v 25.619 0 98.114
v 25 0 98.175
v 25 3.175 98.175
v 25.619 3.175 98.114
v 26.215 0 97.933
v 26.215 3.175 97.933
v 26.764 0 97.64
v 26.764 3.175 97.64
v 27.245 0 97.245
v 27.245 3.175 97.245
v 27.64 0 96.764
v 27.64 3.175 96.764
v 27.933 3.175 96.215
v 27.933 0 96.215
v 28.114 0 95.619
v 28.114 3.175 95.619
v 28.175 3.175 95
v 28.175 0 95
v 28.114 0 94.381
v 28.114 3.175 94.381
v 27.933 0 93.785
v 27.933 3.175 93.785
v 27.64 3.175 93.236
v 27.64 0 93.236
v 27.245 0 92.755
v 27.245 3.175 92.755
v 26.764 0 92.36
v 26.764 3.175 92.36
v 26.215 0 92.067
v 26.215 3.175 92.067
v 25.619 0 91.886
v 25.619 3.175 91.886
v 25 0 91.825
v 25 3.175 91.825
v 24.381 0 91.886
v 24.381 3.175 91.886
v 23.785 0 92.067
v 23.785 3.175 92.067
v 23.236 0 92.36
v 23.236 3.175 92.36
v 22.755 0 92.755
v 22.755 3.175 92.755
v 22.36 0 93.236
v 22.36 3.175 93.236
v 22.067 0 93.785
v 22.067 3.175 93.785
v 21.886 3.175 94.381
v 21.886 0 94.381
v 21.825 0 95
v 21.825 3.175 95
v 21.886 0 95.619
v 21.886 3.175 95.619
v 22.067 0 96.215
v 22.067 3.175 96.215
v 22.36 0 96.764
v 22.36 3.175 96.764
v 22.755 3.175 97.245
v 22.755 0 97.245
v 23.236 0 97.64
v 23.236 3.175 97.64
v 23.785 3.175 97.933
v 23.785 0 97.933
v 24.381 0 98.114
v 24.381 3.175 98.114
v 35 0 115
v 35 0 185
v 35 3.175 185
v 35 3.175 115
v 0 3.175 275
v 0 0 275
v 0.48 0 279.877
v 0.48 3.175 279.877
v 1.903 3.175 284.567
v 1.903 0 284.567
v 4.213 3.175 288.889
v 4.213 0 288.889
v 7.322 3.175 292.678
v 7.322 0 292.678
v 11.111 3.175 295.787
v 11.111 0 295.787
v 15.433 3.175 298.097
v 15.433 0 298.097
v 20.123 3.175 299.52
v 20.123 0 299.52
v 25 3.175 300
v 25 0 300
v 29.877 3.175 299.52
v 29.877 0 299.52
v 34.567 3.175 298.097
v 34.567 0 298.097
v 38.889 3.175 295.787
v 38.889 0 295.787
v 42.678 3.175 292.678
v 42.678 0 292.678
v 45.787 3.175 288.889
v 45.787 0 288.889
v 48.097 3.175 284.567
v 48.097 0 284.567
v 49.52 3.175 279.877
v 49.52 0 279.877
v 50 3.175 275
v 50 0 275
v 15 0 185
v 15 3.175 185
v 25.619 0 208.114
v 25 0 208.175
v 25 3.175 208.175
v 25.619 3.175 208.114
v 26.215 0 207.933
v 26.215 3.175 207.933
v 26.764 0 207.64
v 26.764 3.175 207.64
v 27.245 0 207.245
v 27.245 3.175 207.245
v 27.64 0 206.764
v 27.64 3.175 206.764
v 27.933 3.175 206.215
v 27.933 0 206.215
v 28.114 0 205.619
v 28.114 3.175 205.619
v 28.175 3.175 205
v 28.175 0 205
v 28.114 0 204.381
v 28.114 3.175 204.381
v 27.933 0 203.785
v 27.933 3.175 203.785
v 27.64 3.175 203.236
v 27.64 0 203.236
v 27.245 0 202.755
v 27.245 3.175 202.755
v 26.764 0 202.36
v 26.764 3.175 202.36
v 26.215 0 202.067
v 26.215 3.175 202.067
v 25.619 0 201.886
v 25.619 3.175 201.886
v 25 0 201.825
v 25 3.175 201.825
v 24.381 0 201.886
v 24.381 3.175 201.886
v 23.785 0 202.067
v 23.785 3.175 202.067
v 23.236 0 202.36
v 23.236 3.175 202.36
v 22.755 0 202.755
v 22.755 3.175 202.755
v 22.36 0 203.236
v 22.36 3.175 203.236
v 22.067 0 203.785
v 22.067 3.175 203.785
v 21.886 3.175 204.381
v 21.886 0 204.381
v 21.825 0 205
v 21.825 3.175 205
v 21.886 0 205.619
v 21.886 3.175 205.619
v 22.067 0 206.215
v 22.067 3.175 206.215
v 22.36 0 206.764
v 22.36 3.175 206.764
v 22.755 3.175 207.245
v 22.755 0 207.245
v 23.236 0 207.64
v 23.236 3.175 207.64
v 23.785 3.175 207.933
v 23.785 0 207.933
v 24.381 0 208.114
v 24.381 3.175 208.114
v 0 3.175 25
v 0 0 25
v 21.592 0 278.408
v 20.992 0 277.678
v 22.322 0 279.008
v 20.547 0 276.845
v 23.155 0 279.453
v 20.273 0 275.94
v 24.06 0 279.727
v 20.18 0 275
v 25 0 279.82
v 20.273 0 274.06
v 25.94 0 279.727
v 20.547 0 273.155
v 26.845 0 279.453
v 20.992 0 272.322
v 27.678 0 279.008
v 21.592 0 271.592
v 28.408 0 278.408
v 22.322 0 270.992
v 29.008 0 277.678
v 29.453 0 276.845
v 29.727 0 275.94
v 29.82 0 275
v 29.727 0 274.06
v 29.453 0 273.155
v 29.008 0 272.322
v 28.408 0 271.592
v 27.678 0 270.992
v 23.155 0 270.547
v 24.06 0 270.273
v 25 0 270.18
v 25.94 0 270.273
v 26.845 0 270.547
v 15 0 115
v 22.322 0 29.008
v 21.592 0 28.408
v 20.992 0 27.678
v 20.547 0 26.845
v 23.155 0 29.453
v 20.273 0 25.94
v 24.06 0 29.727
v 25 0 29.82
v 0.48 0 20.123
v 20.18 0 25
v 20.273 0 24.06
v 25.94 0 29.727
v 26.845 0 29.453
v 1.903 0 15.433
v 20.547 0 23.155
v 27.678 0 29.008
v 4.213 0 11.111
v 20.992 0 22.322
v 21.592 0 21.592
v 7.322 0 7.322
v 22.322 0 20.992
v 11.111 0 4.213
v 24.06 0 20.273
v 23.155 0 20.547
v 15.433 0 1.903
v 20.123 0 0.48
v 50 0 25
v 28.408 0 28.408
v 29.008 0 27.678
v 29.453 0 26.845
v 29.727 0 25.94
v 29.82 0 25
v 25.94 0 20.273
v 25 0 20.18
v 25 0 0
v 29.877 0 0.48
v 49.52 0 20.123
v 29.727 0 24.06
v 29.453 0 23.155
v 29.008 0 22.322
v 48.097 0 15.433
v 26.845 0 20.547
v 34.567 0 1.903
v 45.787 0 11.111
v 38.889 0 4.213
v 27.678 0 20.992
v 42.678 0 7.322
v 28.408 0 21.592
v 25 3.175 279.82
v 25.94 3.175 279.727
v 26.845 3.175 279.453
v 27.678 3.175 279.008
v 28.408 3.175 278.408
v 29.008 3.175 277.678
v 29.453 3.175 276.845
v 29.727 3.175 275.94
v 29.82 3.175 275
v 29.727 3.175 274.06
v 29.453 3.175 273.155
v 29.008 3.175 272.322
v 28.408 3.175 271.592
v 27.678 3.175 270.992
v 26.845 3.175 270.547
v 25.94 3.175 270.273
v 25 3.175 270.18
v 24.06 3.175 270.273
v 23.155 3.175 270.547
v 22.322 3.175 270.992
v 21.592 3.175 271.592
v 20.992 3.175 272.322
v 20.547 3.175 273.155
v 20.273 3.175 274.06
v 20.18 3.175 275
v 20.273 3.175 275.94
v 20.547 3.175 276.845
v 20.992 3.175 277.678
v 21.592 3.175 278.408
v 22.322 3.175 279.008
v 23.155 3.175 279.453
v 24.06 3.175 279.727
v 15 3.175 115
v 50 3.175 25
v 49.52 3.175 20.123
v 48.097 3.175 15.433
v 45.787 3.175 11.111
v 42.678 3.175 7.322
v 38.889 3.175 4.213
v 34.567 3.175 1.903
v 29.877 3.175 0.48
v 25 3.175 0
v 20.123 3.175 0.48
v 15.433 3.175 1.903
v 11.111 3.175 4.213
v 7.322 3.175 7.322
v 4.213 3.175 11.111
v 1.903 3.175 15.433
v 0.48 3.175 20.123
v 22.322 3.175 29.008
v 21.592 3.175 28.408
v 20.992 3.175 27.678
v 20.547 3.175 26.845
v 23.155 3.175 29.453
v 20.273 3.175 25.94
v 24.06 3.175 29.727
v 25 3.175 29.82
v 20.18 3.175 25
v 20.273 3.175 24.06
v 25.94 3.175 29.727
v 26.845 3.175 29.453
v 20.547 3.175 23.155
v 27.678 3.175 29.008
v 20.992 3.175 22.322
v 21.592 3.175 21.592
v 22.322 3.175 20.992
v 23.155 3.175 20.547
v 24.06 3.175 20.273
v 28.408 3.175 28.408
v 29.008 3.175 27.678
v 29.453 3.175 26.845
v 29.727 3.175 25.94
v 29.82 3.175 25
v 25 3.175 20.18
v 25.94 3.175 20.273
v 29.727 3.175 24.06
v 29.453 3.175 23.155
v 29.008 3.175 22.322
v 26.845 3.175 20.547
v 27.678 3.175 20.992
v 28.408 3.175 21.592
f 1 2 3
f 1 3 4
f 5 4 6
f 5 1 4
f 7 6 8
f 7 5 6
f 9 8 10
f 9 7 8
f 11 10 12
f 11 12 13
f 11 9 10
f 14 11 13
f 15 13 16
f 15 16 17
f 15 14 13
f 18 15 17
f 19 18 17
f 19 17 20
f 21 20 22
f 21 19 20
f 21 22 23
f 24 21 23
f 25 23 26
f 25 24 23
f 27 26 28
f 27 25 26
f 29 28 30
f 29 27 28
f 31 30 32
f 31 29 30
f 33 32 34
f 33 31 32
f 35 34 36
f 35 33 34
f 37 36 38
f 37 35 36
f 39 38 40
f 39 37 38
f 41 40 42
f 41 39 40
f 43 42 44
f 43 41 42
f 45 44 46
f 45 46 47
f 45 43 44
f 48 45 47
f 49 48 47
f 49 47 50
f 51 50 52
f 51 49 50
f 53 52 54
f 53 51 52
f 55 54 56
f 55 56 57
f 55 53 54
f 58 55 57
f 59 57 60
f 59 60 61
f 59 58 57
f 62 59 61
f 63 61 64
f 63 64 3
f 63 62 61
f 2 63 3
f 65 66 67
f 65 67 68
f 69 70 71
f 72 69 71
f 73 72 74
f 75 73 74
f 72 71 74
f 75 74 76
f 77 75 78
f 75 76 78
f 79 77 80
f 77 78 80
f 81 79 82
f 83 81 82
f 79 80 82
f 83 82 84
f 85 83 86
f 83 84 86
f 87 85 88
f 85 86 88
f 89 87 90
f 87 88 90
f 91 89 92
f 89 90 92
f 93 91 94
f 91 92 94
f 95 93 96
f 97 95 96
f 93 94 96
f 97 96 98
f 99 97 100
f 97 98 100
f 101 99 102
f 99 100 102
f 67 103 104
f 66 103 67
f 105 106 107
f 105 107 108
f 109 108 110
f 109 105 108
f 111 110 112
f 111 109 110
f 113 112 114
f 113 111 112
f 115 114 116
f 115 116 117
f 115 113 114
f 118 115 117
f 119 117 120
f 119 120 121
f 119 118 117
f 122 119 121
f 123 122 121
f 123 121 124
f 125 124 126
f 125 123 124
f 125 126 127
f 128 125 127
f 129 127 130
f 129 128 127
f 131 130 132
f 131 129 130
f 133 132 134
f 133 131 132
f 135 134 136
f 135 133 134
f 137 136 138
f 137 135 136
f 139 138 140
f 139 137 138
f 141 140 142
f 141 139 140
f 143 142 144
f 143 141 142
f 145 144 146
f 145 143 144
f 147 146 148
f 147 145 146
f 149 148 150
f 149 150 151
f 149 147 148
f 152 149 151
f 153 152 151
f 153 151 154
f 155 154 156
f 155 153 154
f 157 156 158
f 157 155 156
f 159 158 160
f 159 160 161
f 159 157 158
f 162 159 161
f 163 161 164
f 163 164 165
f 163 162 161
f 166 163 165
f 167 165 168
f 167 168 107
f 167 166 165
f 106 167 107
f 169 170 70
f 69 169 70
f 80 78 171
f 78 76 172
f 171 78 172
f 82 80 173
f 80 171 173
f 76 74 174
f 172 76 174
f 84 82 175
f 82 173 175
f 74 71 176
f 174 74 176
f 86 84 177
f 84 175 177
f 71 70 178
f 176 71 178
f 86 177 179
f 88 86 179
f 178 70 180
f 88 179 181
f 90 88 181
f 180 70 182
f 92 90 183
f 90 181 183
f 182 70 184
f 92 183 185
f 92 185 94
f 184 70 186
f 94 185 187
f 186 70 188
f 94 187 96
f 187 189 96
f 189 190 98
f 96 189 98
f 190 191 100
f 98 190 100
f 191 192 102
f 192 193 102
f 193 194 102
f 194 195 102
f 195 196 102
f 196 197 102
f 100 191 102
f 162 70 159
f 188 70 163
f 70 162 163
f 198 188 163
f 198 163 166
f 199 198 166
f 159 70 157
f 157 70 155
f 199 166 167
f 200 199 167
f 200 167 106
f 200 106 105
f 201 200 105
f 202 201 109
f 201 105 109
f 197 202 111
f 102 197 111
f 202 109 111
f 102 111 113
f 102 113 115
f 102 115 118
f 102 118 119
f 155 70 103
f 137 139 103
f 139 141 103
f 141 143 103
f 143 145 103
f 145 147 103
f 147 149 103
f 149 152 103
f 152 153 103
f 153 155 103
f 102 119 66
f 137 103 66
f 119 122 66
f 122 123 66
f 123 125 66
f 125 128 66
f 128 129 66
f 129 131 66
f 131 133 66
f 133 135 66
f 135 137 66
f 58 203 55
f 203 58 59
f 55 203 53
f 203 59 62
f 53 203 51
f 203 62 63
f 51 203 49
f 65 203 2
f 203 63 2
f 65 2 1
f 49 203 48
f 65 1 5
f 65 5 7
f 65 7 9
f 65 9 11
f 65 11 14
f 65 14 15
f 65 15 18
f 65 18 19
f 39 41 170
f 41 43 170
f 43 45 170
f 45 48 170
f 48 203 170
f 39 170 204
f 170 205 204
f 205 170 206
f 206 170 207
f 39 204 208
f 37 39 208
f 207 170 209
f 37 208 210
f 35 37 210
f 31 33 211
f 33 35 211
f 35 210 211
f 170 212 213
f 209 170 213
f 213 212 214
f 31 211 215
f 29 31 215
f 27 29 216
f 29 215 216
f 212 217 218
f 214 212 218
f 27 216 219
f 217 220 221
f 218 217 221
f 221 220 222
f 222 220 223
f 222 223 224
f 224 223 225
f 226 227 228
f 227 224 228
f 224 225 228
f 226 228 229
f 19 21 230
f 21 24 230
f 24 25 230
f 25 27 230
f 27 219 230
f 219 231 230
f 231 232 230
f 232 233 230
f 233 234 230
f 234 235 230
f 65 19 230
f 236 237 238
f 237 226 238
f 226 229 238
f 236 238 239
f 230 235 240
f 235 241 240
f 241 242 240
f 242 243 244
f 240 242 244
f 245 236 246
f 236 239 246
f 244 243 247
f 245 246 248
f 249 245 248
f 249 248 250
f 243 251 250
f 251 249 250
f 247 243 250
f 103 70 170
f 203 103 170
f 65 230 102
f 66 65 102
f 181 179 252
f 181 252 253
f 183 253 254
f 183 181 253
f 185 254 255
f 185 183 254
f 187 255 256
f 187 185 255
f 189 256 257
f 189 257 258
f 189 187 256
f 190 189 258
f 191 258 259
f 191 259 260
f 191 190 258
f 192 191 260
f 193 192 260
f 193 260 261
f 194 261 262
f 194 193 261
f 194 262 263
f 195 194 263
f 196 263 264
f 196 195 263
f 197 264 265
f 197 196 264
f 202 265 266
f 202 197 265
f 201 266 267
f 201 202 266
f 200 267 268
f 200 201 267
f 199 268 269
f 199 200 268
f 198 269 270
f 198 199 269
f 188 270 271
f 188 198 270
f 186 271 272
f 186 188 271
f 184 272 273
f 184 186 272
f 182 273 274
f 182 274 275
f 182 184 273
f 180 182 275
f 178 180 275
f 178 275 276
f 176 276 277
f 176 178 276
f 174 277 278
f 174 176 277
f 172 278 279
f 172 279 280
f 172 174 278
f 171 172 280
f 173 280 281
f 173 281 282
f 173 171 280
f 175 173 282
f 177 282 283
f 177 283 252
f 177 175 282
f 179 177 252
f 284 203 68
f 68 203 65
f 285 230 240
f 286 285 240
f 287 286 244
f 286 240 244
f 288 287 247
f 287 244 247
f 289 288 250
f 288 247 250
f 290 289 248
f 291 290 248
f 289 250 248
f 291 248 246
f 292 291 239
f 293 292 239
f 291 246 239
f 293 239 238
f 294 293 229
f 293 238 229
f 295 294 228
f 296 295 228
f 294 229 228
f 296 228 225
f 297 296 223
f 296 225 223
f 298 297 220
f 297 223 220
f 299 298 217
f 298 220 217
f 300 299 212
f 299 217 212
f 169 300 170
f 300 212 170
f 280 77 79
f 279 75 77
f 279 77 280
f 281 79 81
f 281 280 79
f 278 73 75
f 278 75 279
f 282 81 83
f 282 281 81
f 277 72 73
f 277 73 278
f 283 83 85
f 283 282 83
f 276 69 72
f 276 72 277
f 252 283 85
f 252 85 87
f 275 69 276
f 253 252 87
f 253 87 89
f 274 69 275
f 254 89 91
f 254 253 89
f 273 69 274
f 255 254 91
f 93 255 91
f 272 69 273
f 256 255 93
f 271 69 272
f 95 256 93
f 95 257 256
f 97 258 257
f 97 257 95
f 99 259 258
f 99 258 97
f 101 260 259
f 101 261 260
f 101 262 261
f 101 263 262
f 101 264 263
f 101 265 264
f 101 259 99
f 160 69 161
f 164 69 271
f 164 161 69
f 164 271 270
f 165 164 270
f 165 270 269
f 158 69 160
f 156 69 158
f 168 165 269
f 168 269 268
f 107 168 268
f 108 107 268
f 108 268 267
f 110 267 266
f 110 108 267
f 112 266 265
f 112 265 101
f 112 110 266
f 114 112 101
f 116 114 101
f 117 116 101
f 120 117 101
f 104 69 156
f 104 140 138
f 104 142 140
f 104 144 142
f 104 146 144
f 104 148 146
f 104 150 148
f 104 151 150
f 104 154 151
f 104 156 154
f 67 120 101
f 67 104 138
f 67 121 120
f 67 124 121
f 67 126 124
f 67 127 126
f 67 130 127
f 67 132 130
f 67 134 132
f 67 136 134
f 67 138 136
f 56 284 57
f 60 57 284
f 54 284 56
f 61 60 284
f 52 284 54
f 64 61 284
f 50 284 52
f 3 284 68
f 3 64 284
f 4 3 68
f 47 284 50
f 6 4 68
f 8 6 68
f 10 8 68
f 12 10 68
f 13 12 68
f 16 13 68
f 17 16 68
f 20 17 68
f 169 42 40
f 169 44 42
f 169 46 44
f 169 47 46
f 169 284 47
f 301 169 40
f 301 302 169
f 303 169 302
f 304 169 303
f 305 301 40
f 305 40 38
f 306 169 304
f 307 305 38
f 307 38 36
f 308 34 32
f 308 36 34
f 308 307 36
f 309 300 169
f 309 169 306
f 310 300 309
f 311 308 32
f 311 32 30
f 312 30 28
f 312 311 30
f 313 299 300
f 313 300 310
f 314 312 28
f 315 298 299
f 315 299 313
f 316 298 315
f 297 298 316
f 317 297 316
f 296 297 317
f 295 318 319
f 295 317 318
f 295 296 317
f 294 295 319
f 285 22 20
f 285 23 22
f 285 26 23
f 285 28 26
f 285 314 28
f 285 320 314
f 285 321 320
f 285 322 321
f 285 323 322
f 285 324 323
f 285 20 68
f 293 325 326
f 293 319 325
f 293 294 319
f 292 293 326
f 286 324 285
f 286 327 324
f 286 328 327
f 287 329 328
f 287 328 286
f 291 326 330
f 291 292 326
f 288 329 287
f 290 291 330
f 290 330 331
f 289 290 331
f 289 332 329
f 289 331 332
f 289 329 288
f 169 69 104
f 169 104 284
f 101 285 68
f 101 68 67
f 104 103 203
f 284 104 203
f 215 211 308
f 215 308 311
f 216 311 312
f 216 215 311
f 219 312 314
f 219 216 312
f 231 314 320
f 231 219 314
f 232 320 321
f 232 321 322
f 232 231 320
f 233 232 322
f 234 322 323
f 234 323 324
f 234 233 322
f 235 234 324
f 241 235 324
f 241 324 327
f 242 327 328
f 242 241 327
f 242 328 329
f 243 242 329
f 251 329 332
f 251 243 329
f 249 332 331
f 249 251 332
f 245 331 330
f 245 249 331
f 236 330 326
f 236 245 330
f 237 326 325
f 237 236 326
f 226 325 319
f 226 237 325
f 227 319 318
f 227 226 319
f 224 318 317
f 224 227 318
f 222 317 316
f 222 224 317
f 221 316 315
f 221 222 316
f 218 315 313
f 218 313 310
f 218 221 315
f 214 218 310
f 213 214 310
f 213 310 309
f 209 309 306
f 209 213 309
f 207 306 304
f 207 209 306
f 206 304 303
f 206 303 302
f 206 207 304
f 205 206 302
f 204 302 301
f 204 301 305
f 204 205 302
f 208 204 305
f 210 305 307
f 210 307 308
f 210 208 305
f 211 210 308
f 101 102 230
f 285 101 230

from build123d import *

# Parameters (mm, degrees)
SKETCH1_R           = 4.82
SKETCH1_R_2         = 3.175
SKETCH1_W           = 20
SKETCH1_H           = 70
BOSS_EXTRUDE1_DEPTH = 3.175


with BuildPart() as part:
    # Sketch1 → Boss-Extrude1 (new body)
    with BuildSketch(Plane(origin=(0, 0, 0), x_dir=(1, 0, 0), z_dir=(0, 1, 0))):
        with BuildLine():
            ThreePointArc((50, -25), (25, 0), (0, -25))
            Line((0, -25), (0, -274.999999959))
            ThreePointArc((0, -274.999999959), (24.999999979, -300), (50, -275))
            Line((50, -275), (50, -25))
        make_face()
        with Locations(Location((25, -25, 0), (0, 0, 270))):
            Circle(SKETCH1_R, mode=Mode.SUBTRACT)
        with Locations(Location((25, -95, 0), (0, 0, 270))):
            Circle(SKETCH1_R_2, mode=Mode.SUBTRACT)
        with Locations(Location((25, -205, 0), (0, 0, 270))):
            Circle(SKETCH1_R_2, mode=Mode.SUBTRACT)
        with Locations((25, -150)):
            Rectangle(SKETCH1_W, SKETCH1_H, mode=Mode.SUBTRACT)
        with Locations(Location((25, -275, 0), (0, 0, 270))):
            Circle(SKETCH1_R, mode=Mode.SUBTRACT)
    extrude(amount=BOSS_EXTRUDE1_DEPTH)


solid = part.part
